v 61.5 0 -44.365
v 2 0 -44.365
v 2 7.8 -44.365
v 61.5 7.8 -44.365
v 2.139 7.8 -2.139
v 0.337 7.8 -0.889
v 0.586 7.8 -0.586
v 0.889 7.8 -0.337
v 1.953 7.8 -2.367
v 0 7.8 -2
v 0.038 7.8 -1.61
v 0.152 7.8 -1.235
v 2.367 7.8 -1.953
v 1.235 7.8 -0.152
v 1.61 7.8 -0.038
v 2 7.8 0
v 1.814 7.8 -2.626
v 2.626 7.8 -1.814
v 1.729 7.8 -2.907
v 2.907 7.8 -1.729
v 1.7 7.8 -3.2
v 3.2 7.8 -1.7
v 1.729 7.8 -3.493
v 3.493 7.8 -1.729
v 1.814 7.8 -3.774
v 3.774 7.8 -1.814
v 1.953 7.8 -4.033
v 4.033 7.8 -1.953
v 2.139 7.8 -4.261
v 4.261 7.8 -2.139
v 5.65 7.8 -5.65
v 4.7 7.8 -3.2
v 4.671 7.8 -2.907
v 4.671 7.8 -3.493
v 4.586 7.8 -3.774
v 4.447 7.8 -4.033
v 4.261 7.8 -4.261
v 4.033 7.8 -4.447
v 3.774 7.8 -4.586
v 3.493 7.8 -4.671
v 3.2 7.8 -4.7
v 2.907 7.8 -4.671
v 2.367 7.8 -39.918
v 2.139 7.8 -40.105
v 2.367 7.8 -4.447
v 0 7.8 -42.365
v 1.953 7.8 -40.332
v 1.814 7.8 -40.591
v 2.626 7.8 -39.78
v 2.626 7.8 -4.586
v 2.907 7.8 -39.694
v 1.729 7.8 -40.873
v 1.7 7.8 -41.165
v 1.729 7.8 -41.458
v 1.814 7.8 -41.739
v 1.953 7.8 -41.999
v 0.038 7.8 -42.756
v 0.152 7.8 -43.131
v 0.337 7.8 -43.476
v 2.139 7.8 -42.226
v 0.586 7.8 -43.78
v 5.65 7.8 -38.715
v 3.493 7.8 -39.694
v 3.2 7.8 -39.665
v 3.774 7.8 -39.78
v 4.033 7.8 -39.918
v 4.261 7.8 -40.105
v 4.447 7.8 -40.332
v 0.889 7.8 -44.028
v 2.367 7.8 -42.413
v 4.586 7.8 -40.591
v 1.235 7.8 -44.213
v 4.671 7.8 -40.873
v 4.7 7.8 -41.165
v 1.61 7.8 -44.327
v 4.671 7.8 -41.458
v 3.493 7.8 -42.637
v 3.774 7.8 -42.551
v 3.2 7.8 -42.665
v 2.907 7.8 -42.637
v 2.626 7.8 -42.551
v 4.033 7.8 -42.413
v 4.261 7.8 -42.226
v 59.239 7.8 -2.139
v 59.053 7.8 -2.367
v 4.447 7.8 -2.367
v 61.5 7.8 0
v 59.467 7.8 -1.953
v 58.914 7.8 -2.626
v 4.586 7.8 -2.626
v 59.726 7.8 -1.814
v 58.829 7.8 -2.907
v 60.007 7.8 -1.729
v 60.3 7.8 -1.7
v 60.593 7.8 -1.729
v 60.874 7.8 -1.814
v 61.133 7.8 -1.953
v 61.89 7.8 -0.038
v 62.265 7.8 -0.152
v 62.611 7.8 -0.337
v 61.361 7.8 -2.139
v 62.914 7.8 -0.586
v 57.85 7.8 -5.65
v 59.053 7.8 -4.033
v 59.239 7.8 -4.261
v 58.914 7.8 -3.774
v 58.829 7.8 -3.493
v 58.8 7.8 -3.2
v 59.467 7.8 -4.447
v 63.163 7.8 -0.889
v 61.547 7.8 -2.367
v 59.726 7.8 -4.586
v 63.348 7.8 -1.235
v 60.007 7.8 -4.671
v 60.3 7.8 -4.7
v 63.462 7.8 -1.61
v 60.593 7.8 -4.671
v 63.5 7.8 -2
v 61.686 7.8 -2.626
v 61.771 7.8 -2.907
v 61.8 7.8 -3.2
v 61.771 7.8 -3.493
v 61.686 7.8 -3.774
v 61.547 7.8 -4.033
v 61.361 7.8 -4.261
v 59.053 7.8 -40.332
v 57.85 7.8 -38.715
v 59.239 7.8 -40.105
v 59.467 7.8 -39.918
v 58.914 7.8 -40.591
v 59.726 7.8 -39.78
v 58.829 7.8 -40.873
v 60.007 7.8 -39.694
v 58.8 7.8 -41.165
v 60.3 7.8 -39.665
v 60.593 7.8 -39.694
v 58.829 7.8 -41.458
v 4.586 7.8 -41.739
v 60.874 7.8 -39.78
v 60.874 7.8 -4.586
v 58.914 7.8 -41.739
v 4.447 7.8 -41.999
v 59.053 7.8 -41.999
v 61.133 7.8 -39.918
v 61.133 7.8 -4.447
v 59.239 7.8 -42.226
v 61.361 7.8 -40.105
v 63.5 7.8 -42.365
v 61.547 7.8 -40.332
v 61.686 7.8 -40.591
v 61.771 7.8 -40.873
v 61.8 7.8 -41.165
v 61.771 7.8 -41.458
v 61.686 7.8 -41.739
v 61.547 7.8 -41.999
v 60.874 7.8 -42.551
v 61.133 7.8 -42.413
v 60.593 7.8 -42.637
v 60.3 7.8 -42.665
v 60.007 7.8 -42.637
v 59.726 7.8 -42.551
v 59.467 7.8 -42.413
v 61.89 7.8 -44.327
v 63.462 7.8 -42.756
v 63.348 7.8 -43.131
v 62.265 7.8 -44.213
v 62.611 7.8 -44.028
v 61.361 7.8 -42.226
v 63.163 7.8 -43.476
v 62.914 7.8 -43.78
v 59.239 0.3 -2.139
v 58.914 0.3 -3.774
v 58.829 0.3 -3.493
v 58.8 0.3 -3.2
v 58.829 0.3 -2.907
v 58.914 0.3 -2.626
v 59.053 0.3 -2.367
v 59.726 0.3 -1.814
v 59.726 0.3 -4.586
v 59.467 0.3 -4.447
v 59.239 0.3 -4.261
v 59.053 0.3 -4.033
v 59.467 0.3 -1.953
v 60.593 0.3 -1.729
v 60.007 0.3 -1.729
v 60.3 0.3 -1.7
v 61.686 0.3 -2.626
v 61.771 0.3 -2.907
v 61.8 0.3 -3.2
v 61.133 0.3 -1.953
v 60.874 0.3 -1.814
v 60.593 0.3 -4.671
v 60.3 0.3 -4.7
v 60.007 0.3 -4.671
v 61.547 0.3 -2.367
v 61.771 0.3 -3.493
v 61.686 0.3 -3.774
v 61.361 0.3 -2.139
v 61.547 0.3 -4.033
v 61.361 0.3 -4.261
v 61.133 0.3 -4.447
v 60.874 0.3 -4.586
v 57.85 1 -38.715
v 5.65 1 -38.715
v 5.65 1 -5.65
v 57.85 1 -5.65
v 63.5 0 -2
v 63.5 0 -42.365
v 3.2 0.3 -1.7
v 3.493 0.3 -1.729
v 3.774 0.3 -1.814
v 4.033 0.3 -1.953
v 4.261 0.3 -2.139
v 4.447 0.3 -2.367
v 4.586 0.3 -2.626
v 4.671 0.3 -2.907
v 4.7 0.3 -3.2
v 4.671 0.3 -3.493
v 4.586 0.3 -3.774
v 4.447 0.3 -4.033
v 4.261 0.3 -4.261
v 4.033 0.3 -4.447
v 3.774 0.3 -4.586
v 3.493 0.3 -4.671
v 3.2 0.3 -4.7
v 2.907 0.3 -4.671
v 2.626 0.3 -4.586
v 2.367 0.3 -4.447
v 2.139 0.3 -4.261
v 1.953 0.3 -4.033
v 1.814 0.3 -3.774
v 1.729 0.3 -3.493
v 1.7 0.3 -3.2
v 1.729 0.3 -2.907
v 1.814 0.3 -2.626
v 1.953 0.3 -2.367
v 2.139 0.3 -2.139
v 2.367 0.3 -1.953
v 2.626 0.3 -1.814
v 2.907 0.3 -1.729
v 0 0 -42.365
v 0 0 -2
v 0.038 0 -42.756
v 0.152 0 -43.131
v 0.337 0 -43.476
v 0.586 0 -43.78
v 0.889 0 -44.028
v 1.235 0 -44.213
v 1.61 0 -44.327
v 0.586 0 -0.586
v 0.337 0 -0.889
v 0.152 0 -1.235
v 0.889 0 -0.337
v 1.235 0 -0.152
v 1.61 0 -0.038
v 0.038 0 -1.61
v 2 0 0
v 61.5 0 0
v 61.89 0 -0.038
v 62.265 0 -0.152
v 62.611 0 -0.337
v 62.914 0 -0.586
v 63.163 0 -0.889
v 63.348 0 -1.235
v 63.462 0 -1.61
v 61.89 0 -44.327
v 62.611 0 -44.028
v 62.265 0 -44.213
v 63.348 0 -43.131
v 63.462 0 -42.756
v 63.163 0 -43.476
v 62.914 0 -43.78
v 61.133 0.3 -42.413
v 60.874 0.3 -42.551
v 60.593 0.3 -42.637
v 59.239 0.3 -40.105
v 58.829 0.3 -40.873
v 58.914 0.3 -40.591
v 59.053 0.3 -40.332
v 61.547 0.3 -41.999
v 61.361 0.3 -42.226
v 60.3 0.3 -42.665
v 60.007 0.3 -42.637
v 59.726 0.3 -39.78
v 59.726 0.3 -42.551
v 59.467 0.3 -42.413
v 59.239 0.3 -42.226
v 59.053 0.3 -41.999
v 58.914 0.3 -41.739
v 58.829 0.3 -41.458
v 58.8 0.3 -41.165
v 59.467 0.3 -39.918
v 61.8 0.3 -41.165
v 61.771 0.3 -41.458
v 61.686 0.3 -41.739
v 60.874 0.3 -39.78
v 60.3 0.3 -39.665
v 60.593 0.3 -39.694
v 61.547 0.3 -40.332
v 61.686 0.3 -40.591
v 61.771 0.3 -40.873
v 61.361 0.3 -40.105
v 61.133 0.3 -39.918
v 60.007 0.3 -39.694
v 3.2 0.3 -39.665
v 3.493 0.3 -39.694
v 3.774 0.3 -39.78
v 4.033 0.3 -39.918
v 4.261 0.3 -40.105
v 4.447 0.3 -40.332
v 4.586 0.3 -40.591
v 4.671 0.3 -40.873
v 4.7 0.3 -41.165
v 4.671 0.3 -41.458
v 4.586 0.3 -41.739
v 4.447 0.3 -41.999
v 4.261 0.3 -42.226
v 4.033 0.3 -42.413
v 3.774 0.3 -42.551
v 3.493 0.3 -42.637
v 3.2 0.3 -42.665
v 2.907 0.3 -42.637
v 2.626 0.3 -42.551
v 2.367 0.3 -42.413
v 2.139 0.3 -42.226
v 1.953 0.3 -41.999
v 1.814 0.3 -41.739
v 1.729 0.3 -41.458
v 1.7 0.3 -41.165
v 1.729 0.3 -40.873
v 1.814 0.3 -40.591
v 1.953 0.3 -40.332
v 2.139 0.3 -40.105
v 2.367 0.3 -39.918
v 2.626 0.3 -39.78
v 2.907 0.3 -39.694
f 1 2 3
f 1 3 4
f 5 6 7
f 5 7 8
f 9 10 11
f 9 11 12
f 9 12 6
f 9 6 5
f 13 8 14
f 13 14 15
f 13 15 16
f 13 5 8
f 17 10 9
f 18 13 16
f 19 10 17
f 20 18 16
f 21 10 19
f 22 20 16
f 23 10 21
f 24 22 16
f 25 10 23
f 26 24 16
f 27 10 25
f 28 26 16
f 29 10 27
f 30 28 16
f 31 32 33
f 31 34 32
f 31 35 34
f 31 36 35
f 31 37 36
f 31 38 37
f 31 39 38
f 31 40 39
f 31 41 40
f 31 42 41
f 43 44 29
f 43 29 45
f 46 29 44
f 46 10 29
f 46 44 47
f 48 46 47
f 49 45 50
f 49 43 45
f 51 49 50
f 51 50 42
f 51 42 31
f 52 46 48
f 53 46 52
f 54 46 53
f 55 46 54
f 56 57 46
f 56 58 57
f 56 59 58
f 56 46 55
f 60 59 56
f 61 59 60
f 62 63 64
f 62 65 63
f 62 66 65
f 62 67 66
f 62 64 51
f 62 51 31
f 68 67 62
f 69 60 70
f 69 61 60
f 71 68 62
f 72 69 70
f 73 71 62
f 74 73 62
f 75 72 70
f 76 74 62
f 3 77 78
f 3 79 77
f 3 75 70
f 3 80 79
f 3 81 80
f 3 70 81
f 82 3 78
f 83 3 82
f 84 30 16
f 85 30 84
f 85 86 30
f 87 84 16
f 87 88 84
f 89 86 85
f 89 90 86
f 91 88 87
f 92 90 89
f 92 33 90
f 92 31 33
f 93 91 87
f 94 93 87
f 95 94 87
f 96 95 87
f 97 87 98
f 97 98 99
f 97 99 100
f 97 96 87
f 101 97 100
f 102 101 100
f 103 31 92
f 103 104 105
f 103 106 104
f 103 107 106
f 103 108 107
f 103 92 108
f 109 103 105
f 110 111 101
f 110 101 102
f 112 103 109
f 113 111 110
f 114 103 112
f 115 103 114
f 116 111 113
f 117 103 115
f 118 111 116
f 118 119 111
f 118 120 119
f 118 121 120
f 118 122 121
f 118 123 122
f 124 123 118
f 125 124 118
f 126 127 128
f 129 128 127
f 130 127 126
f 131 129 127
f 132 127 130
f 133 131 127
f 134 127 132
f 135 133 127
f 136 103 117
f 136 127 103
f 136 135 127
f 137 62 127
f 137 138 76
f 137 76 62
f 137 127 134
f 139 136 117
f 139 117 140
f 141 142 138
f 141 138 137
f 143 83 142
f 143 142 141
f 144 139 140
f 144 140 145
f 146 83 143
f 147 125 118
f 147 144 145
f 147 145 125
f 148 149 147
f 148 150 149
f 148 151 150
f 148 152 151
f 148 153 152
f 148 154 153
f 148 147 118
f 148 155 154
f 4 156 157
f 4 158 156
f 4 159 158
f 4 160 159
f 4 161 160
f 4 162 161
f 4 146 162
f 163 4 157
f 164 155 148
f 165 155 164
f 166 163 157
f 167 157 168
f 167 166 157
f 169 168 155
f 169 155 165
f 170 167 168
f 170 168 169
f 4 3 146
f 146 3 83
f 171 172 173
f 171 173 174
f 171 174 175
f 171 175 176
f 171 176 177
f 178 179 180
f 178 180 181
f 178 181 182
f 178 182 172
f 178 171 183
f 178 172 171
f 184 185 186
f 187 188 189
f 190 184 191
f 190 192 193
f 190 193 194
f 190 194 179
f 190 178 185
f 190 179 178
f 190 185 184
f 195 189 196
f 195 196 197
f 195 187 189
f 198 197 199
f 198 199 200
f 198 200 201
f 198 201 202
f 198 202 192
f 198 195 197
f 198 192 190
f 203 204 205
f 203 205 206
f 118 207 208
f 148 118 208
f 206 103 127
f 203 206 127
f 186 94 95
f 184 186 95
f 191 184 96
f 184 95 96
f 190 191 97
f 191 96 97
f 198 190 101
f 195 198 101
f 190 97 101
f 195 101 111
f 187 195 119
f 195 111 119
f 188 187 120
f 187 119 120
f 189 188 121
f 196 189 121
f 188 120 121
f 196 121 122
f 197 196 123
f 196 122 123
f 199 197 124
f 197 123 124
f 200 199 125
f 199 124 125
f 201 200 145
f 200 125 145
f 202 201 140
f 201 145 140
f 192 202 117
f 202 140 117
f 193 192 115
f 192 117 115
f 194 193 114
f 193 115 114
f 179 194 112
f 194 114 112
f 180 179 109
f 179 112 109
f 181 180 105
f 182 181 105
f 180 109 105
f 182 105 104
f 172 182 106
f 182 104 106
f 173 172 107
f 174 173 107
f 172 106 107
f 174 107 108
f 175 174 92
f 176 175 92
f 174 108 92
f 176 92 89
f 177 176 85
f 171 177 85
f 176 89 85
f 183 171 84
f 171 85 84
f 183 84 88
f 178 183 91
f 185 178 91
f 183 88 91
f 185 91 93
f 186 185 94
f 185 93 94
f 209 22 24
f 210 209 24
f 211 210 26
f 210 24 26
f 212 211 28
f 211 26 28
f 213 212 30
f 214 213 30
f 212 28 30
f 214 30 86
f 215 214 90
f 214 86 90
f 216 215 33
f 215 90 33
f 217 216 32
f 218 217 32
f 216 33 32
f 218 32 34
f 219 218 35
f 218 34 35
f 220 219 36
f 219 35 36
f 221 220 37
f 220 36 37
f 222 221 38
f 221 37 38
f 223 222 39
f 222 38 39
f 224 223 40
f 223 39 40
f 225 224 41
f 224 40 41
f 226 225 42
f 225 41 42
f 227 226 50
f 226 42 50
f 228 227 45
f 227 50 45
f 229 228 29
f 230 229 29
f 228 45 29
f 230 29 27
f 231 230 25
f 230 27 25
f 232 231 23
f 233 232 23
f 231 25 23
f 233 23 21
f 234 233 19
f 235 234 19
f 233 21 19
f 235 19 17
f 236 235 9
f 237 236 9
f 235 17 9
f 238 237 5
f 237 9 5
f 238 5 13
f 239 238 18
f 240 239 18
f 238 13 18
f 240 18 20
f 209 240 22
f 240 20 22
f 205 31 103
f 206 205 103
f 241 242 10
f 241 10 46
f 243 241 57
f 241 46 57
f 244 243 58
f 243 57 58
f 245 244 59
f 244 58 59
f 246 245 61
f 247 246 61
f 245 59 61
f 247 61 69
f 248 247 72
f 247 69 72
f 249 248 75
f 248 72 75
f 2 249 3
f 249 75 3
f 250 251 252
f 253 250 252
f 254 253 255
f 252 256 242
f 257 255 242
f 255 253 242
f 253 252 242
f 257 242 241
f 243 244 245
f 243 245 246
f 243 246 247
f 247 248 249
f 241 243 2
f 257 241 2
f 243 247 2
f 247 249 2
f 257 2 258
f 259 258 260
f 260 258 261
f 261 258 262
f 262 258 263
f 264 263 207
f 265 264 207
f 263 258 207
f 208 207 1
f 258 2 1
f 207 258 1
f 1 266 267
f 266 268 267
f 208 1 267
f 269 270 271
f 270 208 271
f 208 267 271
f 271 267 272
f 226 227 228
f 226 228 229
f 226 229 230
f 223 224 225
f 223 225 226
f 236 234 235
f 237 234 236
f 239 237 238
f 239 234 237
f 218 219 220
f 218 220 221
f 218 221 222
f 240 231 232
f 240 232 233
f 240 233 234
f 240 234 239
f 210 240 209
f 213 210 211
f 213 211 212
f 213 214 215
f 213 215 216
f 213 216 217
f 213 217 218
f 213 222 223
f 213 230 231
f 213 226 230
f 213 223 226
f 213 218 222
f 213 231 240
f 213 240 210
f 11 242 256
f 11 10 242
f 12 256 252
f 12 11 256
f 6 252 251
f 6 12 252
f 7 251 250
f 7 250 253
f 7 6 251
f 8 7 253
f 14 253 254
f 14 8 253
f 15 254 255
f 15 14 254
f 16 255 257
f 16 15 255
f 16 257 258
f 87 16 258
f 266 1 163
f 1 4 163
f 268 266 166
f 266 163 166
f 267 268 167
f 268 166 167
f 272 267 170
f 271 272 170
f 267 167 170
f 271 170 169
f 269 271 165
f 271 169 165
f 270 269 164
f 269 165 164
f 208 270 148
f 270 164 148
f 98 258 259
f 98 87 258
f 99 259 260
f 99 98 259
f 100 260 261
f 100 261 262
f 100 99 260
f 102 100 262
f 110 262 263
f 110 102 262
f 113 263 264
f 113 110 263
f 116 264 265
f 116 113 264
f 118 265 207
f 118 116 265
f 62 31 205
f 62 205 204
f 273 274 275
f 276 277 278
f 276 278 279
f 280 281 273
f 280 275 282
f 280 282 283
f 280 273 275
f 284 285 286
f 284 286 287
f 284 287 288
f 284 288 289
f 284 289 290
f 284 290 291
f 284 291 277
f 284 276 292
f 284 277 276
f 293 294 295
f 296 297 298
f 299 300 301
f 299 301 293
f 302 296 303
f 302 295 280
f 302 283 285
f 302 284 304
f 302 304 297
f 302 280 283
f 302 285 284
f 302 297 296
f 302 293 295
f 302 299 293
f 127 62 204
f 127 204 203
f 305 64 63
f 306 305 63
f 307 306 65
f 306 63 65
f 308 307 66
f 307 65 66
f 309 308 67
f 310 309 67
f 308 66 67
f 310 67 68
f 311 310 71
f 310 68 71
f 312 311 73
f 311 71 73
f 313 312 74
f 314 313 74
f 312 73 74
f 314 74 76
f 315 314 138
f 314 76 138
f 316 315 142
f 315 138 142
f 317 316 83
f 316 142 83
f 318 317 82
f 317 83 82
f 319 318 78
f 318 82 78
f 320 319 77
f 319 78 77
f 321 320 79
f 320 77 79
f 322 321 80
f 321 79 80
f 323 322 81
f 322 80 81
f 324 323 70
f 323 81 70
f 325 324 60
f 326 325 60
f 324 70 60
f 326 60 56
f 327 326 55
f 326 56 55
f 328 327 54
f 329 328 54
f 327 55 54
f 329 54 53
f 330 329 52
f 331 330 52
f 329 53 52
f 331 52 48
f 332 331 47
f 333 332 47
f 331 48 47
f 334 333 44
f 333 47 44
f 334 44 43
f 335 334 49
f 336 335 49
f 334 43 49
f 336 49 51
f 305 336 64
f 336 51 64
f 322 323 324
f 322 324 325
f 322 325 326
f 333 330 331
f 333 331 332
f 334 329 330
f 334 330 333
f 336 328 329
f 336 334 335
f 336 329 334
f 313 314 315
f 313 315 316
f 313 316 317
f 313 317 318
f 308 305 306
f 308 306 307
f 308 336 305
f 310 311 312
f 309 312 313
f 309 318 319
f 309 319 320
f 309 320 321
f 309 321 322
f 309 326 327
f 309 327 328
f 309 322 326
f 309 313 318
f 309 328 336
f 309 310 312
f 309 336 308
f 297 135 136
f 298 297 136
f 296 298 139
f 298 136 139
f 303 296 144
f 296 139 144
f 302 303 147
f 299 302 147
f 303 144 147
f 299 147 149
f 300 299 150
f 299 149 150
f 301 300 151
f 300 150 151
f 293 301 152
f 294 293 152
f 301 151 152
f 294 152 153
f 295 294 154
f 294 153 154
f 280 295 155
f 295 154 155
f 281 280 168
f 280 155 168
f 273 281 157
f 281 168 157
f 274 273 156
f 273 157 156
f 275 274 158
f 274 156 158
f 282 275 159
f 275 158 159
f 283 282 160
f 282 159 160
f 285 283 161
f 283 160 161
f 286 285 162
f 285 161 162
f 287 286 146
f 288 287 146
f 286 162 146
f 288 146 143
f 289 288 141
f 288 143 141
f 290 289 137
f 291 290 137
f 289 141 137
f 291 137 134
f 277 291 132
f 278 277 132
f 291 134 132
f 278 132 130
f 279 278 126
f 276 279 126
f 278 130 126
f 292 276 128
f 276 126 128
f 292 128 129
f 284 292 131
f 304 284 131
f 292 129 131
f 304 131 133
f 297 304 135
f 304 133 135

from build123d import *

# Parameters (mm, degrees)
SKETCH1_W           = 63.5
SKETCH1_H           = 44.36533334
BOSS_EXTRUDE1_DEPTH = 7.8
SKETCH2_W           = 52.20000001
SKETCH2_H           = 33.06533334
CUT_EXTRUDE1_DEPTH  = 6.8
SKETCH3_R           = 1.5
SKETCH3_R_2         = 1.50000001
CUT_EXTRUDE2_DEPTH  = 7.5
FILLET1_R           = 2


with BuildPart() as part:
    # Sketch1 → Boss-Extrude1 (new body)
    with BuildSketch(Plane(origin=(0, 0, 0), x_dir=(1, 0, 0), z_dir=(0, 1, 0))):
        with Locations((31.75, 22.18266667)):
            Rectangle(SKETCH1_W, SKETCH1_H)
    extrude(amount=BOSS_EXTRUDE1_DEPTH)

    # Sketch2 → Cut-Extrude1 (cut)
    with BuildSketch(Plane(origin=(0, 7.8, 0), x_dir=(1, 0, 0), z_dir=(0, 1, 0))):
        with Locations((31.750000005, 22.18266667)):
            Rectangle(SKETCH2_W, SKETCH2_H)
    extrude(amount=-CUT_EXTRUDE1_DEPTH, mode=Mode.SUBTRACT)

    # Sketch3 → Cut-Extrude2 (cut)
    with BuildSketch(Plane(origin=(0, 7.8, 0), x_dir=(1, 0, 0), z_dir=(0, 1, 0))):
        with Locations(Location((3.2, 3.2, 0), (0, 0, 270))):
            Circle(SKETCH3_R)
        with Locations(Location((3.2, 41.16533334, 0), (0, 0, 270))):
            Circle(SKETCH3_R)
        with Locations(Location((60.3, 41.16533334, 0), (0, 0, 270))):
            Circle(SKETCH3_R_2)
        with Locations(Location((60.3, 3.2, 0), (0, 0, 270))):
            Circle(SKETCH3_R_2)
    extrude(amount=-CUT_EXTRUDE2_DEPTH, mode=Mode.SUBTRACT)

    # Fillet1
    fillet1_edges = [part.edges().sort_by_distance(p)[0] for p in [
        (0, 3.9, -44.36533334),
        (63.5, 3.9, -44.36533334),
        (63.5, 3.9, 0),
        (0, 3.9, 0),
    ]]
    fillet(fillet1_edges, radius=FILLET1_R)


solid = part.part
